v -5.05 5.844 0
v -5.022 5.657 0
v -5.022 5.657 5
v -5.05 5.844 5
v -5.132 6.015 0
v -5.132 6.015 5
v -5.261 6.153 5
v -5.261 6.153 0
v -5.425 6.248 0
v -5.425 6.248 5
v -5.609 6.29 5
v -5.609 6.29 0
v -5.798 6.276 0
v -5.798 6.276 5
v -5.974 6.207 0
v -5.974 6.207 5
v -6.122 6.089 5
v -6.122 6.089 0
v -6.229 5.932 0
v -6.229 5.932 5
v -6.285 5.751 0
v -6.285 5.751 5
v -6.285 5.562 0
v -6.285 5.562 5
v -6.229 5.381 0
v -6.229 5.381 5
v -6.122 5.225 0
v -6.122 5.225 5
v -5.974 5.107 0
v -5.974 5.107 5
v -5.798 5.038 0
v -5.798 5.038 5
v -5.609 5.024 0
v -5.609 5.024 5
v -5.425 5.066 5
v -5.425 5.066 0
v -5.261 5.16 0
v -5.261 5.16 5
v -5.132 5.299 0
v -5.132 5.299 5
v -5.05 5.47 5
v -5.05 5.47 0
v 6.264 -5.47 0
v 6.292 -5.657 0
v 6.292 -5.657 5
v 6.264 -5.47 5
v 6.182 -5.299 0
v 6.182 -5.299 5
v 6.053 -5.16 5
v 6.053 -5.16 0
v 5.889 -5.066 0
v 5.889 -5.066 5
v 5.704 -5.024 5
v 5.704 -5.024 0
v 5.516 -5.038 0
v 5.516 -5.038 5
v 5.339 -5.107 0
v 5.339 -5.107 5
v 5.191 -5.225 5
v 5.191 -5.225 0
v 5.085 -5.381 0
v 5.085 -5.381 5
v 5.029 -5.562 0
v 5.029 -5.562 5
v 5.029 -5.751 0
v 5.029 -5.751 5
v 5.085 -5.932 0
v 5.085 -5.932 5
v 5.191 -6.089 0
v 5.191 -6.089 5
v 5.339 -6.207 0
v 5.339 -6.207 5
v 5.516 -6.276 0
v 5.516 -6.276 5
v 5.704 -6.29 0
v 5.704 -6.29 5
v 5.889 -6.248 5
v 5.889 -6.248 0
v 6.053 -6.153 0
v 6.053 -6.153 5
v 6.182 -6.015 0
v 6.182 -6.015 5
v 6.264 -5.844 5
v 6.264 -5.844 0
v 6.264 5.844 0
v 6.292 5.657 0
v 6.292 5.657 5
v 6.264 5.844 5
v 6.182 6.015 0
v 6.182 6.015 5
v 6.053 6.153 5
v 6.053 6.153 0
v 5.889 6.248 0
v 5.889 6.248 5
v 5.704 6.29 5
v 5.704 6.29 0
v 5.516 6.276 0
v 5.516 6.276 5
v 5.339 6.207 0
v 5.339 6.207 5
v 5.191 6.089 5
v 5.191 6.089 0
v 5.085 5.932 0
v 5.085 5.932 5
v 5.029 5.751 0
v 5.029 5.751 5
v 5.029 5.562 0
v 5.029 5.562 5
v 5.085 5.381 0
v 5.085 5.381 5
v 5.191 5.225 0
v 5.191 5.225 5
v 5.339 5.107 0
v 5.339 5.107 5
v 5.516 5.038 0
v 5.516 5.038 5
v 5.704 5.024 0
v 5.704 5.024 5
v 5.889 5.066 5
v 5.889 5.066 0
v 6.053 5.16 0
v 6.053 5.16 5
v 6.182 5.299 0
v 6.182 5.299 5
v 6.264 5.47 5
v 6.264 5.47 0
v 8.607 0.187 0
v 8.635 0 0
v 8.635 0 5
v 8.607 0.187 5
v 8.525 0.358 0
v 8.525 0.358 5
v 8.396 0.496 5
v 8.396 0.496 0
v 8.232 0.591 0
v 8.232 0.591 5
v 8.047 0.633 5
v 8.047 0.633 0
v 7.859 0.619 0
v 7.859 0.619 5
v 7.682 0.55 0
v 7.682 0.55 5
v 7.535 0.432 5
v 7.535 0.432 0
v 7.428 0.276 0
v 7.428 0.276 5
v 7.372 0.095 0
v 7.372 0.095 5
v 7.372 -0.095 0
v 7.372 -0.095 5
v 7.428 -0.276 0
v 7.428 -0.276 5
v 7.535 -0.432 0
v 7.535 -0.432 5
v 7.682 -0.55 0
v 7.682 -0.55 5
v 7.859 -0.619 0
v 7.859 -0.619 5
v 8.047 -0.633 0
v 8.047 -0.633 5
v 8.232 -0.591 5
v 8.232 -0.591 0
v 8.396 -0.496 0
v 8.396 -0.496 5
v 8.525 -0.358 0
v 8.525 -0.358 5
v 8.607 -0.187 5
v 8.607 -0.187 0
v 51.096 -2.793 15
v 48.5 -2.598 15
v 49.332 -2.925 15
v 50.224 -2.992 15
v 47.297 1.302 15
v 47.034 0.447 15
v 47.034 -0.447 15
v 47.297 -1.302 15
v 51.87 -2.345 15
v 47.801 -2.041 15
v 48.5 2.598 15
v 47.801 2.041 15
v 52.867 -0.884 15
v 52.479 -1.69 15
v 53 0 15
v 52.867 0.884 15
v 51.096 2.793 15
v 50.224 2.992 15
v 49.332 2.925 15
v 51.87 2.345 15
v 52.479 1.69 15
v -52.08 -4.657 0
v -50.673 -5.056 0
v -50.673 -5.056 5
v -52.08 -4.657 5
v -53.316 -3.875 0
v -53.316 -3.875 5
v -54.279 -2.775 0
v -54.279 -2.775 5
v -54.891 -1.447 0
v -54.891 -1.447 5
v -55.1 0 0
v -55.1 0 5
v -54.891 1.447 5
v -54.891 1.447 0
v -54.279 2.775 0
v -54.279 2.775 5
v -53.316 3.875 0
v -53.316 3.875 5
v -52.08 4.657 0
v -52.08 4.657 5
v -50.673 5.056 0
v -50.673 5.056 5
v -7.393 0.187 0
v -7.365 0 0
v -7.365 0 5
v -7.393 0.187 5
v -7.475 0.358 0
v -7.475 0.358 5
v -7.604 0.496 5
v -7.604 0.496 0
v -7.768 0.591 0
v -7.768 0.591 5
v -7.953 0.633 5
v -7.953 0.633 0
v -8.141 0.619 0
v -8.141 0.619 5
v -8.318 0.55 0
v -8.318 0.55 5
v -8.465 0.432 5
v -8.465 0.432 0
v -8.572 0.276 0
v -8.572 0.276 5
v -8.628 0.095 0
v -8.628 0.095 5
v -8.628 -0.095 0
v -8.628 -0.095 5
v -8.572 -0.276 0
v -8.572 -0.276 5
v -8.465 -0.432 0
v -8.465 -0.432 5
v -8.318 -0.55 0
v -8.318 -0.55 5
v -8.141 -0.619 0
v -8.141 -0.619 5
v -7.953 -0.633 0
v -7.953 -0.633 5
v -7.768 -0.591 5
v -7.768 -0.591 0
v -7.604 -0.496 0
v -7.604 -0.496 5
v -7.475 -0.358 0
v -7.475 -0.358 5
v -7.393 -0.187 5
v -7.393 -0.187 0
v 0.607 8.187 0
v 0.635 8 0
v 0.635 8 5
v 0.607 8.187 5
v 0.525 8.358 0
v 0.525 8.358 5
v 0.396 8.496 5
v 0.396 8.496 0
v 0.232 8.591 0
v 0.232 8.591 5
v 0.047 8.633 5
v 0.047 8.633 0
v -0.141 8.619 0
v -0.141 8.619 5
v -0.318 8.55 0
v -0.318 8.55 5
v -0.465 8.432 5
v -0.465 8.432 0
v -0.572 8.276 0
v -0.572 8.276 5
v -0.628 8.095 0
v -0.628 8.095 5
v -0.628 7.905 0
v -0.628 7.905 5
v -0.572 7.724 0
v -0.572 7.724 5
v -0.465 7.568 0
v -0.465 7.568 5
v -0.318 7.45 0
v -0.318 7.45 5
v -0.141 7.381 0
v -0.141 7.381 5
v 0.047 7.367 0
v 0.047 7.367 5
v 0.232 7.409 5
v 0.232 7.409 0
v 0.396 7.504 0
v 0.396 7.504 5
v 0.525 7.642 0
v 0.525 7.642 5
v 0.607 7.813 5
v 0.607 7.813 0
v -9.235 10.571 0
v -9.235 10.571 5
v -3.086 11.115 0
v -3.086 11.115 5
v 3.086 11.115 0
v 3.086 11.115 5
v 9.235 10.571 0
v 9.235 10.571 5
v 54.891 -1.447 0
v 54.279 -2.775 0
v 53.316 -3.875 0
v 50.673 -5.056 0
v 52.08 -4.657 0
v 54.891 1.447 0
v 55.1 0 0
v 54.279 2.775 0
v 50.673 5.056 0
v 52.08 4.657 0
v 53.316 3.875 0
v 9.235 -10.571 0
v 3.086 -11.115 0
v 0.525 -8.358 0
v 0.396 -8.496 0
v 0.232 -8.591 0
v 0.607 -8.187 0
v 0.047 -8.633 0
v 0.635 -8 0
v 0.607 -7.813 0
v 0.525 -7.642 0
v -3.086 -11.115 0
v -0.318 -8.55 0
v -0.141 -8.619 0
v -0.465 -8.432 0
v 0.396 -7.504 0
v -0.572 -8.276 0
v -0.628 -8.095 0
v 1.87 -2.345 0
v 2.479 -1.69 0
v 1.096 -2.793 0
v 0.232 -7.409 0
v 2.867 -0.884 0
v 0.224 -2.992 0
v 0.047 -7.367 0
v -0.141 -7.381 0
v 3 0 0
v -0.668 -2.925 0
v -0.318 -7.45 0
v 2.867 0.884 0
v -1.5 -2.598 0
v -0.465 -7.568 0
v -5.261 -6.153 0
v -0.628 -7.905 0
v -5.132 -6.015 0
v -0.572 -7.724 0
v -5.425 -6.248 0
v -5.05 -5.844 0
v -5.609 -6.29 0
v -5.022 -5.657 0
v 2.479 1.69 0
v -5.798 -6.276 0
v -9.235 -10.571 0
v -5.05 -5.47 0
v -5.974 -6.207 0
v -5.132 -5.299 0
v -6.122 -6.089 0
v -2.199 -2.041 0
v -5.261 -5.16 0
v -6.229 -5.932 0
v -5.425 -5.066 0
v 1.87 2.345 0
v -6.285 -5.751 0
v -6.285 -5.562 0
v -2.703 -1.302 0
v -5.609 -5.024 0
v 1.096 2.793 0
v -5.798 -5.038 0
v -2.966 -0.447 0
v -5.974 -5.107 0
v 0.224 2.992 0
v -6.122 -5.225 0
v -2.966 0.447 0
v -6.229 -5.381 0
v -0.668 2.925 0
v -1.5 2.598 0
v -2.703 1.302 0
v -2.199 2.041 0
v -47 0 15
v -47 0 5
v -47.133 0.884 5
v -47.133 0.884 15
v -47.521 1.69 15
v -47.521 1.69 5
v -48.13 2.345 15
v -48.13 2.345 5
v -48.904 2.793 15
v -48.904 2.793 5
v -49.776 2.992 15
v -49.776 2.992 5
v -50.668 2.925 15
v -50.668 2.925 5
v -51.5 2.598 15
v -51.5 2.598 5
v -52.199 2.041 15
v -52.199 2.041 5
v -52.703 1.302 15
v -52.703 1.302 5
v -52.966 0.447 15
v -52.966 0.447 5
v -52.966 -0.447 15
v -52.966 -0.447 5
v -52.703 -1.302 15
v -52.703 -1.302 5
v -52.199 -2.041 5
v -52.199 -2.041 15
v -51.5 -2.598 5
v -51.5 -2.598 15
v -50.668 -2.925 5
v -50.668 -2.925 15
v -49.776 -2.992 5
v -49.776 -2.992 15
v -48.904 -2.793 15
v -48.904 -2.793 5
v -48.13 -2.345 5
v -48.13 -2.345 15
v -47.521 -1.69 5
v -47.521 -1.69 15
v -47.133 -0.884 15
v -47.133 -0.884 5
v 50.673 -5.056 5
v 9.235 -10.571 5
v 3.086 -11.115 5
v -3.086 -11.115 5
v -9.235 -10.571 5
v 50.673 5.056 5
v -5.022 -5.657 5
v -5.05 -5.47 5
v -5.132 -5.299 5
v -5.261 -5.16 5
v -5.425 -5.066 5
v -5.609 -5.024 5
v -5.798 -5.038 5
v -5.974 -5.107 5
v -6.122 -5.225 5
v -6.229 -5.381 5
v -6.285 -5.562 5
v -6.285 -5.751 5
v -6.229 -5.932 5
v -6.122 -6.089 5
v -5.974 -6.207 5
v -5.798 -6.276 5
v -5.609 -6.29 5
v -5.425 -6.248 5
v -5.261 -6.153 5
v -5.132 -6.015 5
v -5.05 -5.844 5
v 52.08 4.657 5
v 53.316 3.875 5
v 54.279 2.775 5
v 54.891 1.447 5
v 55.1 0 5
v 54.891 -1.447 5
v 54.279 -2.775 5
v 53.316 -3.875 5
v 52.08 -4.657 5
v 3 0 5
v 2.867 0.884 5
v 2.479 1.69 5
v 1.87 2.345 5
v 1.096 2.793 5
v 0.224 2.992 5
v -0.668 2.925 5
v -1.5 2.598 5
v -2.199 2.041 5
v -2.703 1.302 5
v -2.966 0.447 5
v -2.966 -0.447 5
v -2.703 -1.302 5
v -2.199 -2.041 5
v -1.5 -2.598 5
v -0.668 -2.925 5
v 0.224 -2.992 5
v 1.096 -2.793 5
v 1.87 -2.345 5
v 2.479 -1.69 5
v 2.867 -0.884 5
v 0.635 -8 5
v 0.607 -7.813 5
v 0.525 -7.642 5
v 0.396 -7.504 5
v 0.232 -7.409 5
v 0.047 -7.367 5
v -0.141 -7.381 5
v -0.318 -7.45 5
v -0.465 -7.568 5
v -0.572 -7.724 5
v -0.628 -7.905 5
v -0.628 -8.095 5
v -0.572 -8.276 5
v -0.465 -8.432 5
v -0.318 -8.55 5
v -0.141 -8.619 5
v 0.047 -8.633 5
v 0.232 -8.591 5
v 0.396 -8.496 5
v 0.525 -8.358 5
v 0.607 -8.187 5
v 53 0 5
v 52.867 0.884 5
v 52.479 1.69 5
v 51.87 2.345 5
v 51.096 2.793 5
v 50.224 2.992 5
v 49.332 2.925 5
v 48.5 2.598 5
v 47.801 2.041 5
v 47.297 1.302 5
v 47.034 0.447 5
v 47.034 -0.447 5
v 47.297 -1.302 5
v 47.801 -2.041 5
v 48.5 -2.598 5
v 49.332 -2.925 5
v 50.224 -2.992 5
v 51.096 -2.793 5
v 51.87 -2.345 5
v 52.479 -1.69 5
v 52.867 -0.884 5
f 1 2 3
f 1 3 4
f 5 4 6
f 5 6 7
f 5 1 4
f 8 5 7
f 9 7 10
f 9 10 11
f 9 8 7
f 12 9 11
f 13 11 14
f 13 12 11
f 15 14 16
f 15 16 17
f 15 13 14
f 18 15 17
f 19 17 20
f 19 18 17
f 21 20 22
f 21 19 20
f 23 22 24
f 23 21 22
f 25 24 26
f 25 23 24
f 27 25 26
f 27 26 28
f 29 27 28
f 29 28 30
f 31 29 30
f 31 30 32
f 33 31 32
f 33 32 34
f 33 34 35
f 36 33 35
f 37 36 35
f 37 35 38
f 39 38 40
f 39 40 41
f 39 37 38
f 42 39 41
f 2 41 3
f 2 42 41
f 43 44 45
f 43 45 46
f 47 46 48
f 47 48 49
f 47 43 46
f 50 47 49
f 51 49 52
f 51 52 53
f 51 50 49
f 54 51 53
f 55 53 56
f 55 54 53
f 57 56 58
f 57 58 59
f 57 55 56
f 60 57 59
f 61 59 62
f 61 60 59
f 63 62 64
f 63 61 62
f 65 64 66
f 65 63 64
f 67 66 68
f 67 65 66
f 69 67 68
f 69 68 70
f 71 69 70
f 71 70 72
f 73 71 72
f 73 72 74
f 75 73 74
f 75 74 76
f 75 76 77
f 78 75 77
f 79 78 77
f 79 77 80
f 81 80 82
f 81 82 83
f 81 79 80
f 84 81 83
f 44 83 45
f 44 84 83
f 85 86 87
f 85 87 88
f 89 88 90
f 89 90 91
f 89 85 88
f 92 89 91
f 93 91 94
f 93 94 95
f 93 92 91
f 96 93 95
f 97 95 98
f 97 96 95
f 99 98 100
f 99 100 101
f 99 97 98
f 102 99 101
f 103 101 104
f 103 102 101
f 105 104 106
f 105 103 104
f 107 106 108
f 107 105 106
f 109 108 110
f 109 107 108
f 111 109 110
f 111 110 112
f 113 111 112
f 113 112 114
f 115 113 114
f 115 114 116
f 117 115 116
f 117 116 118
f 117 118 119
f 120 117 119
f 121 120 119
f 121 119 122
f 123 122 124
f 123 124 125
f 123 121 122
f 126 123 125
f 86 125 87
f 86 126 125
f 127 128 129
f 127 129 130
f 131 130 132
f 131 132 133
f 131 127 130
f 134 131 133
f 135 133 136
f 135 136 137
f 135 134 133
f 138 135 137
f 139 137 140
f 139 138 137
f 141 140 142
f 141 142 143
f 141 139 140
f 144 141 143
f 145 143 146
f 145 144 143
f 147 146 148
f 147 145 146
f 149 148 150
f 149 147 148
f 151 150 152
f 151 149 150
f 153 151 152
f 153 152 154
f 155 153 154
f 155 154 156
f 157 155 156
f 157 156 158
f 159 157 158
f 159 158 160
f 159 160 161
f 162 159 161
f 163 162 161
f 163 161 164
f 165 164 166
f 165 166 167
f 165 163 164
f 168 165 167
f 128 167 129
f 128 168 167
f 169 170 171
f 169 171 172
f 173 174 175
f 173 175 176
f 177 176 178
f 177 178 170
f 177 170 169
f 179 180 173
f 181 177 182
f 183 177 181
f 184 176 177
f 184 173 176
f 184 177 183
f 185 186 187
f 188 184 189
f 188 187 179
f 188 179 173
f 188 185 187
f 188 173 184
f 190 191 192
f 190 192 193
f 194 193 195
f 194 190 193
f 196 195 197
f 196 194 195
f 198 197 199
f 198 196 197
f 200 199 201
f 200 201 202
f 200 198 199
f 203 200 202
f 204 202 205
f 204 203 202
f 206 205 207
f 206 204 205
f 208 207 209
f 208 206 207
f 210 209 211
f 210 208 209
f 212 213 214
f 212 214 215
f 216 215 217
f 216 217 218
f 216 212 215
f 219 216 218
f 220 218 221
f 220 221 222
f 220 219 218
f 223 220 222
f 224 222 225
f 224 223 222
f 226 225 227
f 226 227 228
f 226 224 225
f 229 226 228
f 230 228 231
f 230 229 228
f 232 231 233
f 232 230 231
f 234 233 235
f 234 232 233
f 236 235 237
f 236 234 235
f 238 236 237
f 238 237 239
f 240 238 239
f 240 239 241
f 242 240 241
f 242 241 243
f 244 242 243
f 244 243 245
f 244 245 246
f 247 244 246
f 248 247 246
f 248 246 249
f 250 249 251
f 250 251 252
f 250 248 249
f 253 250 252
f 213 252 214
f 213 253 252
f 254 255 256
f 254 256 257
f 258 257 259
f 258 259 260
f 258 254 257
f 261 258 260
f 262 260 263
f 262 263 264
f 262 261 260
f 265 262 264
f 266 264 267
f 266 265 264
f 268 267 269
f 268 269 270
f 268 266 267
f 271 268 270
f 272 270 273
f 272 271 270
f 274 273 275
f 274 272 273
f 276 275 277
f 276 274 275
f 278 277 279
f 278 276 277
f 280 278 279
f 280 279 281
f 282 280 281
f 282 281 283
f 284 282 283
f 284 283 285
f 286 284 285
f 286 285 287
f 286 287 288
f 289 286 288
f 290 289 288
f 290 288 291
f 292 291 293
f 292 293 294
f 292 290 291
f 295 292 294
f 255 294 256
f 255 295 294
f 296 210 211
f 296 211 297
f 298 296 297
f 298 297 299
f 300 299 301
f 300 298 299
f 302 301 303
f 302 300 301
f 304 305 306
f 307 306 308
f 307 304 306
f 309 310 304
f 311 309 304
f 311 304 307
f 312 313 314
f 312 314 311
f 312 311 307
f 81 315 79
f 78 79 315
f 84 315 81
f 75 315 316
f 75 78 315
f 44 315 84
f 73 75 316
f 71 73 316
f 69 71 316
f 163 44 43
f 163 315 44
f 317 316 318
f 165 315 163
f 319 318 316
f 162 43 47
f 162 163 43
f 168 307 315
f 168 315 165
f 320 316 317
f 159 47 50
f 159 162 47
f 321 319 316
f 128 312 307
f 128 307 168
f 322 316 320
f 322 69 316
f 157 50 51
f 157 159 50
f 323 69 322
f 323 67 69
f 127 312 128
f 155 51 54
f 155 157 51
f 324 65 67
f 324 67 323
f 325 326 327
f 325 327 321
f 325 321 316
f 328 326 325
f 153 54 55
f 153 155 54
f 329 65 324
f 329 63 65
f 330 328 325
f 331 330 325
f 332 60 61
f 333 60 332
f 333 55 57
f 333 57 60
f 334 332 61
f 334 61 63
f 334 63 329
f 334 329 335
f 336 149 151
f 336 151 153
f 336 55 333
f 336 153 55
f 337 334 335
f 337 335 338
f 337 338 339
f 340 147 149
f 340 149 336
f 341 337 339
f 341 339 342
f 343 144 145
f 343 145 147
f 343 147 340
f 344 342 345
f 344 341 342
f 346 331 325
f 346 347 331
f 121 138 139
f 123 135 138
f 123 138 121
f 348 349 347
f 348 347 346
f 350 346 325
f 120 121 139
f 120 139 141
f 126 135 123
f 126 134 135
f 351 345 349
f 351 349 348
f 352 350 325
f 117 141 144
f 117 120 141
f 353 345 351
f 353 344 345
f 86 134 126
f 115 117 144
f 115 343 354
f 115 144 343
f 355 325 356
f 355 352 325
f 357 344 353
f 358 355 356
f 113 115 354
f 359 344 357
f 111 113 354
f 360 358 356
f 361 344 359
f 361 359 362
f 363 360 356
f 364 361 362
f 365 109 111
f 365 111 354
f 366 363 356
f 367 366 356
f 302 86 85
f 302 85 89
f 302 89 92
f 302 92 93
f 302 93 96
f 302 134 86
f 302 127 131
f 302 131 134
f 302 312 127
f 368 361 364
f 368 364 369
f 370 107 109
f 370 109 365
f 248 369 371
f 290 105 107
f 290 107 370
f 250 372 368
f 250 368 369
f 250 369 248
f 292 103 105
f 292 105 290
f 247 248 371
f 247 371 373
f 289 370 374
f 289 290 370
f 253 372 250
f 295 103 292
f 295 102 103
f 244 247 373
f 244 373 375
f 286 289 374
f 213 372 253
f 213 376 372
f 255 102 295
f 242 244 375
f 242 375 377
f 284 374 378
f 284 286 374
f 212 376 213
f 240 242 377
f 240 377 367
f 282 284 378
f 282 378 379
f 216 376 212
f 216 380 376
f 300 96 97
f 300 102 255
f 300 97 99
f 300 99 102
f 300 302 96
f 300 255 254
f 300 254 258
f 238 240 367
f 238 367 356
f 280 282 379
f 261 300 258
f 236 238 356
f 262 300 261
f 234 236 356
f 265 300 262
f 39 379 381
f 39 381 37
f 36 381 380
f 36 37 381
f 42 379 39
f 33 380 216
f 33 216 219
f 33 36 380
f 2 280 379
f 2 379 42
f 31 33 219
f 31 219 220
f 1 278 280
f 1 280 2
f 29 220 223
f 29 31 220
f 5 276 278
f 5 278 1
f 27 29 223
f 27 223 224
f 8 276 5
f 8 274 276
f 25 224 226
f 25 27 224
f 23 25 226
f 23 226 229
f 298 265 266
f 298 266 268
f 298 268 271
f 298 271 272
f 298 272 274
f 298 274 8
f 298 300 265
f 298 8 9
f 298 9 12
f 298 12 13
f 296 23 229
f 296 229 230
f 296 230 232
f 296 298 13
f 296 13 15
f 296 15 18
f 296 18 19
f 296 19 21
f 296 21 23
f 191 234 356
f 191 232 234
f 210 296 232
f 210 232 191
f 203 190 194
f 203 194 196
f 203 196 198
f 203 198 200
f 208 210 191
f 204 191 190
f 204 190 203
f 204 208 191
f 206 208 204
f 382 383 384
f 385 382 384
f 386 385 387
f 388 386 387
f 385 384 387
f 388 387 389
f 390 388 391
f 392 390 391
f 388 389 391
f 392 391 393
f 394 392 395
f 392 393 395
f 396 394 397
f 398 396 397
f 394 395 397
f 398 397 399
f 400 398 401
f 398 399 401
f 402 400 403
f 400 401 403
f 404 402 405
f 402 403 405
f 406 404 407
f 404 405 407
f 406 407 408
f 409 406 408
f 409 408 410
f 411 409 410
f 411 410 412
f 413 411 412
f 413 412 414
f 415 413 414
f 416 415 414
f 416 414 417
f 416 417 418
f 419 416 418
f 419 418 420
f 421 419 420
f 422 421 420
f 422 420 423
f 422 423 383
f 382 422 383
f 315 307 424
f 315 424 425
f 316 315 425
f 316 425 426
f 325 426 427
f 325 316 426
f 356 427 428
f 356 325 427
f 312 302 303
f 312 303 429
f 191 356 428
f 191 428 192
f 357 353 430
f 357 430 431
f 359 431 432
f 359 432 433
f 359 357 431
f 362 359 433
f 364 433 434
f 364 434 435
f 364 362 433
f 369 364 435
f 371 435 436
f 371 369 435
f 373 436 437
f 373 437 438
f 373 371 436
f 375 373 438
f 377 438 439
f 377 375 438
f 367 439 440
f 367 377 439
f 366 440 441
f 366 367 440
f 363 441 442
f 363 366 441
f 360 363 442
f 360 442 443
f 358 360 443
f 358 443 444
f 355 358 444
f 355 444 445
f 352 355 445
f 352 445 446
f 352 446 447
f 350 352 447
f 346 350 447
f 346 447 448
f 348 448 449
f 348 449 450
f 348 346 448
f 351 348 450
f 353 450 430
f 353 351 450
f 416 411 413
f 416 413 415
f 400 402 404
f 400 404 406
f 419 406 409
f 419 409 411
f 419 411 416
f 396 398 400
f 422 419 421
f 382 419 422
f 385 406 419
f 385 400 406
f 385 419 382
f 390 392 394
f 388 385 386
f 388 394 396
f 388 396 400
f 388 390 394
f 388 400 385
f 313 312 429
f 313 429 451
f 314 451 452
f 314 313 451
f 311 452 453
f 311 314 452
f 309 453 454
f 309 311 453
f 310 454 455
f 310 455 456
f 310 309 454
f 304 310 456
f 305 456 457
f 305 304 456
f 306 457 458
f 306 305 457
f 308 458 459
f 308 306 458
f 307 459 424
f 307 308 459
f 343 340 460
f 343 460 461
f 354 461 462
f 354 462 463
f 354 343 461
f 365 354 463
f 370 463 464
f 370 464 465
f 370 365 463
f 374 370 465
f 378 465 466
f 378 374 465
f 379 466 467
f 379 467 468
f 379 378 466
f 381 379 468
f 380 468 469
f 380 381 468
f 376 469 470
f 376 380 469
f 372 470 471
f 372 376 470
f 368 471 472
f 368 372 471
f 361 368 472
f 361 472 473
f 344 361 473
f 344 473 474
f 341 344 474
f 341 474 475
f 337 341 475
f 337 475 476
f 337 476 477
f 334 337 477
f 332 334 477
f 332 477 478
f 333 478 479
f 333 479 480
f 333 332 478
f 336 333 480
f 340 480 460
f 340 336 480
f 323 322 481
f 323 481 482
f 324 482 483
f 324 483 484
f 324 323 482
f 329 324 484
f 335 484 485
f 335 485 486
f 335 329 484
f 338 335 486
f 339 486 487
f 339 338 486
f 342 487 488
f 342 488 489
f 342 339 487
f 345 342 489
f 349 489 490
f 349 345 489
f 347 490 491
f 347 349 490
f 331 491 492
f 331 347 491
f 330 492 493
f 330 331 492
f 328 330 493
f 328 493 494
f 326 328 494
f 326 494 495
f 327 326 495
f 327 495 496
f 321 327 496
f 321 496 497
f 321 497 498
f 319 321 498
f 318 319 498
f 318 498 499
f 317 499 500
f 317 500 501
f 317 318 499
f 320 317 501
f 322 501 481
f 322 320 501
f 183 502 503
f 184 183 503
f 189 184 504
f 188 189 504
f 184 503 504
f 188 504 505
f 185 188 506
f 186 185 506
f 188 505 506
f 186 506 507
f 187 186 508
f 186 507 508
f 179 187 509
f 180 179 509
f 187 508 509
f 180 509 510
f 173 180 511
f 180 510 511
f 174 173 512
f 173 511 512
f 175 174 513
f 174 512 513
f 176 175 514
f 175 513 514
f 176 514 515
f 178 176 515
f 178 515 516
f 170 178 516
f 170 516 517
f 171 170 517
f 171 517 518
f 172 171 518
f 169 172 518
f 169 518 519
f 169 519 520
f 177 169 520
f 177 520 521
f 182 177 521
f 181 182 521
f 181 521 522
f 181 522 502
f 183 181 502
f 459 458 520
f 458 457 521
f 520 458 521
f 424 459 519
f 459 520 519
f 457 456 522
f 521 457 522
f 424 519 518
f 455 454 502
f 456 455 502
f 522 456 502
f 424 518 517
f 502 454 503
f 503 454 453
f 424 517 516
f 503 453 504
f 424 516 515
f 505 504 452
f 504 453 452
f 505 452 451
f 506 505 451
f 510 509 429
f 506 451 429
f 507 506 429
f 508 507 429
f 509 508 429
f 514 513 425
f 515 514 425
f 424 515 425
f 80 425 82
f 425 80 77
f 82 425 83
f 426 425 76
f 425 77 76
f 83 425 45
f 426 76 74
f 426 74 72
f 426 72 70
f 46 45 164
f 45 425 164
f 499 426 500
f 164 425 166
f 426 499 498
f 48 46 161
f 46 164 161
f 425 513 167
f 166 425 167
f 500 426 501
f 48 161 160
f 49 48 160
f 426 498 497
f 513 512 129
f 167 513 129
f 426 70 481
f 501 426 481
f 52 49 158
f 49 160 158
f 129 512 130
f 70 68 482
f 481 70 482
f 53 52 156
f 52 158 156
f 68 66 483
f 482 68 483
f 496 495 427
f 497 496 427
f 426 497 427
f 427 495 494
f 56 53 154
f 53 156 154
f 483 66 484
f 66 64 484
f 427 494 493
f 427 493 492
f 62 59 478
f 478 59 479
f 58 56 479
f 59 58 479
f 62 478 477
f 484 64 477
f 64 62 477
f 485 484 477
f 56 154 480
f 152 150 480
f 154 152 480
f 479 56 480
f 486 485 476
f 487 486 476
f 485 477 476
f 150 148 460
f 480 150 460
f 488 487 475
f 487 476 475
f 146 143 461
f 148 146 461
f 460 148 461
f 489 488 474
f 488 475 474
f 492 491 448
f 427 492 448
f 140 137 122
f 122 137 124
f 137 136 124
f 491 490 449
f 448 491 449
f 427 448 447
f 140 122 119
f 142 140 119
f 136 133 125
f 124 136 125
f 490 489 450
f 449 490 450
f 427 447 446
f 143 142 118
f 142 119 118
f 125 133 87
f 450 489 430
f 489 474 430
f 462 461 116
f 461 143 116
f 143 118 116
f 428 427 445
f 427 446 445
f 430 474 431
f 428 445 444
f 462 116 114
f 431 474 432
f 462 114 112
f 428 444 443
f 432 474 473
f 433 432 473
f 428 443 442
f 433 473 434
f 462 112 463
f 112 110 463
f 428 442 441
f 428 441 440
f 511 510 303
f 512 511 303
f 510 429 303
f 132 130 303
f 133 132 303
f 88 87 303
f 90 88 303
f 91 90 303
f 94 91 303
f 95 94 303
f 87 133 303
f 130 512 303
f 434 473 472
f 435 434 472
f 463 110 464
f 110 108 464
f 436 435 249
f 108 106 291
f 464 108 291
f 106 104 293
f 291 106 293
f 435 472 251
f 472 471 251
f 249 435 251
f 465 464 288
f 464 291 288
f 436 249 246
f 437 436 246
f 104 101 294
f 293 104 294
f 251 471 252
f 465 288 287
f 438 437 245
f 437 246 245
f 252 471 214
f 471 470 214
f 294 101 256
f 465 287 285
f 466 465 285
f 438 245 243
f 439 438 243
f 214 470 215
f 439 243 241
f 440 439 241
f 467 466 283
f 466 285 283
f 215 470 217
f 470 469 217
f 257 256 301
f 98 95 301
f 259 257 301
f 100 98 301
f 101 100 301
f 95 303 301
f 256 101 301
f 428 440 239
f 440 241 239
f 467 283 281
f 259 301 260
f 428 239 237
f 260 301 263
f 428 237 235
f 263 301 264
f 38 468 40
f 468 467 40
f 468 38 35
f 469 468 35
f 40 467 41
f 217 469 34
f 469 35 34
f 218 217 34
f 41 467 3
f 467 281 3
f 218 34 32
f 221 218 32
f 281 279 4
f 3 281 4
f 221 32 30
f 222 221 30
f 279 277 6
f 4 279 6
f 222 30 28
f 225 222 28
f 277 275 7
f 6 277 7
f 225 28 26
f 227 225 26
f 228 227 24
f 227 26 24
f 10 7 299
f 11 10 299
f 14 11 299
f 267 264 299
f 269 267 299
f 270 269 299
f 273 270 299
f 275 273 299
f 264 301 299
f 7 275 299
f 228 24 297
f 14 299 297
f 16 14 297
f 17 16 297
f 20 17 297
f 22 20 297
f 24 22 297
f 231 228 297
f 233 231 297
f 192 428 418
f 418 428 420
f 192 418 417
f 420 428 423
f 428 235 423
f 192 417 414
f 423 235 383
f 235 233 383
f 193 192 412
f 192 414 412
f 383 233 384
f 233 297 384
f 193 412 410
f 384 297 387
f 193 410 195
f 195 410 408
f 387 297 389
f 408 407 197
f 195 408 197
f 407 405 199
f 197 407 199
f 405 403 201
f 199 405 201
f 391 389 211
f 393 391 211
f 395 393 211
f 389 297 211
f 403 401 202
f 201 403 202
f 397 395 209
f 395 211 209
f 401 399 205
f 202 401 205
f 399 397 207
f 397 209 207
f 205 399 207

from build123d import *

# Parameters (mm, degrees)
SZKIC1_R                    = 3
SZKIC1_R_2                  = 0.635
DODANIE_WYCI_GNI_CIE1_DEPTH = 5
SZKIC1_2_R                  = 3
DODANIE_WYCI_GNI_CIE2_DEPTH = 15


with BuildPart() as part:
    # Szkic1 → Dodanie-wyci_gni_cie1 (new body)
    with BuildSketch(Plane.XY):
        with BuildLine():
            Line((-50.67287635, 5.055665151), (-9.235111676, 10.570763761))
            ThreePointArc((-9.235111676, 10.570763761), (0, 11.182632843), (9.235111676, 10.570763761))
            Line((9.235111676, 10.570763761), (50.67287635, 5.055665151))
            ThreePointArc((50.67287635, 5.055665151), (55.100246338, 0), (50.67287635, -5.055665151))
            Line((50.67287635, -5.055665151), (9.235111676, -10.570763761))
            ThreePointArc((9.235111676, -10.570763761), (0, -11.182632843), (-9.235111676, -10.570763761))
            Line((-9.235111676, -10.570763761), (-50.67287635, -5.055665151))
            ThreePointArc((-50.67287635, -5.055665151), (-55.100246338, 0), (-50.67287635, 5.055665151))
        make_face()
        Circle(SZKIC1_R, mode=Mode.SUBTRACT)
        with Locations((-5.656854249, 5.656854249)):
            Circle(SZKIC1_R_2, mode=Mode.SUBTRACT)
        with Locations((-8, 0)):
            Circle(SZKIC1_R_2, mode=Mode.SUBTRACT)
        with Locations((0, 8)):
            Circle(SZKIC1_R_2, mode=Mode.SUBTRACT)
        with Locations((5.656854249, 5.656854249)):
            Circle(SZKIC1_R_2, mode=Mode.SUBTRACT)
        with Locations((-50, 0)):
            Circle(SZKIC1_R, mode=Mode.SUBTRACT)
        with Locations((50, 0)):
            Circle(SZKIC1_R, mode=Mode.SUBTRACT)
        with Locations((8, 0)):
            Circle(SZKIC1_R_2, mode=Mode.SUBTRACT)
        with Locations((5.656854249, -5.656854249)):
            Circle(SZKIC1_R_2, mode=Mode.SUBTRACT)
        with Locations((0, -8)):
            Circle(SZKIC1_R_2, mode=Mode.SUBTRACT)
        with Locations((-5.656854249, -5.656854249)):
            Circle(SZKIC1_R_2, mode=Mode.SUBTRACT)
    extrude(amount=DODANIE_WYCI_GNI_CIE1_DEPTH)

    # Szkic1_2 → Dodanie-wyci_gni_cie2 (add)
    with BuildSketch(Plane.XY):
        with Locations((-50, 0)):
            Circle(SZKIC1_2_R)
        with Locations((50, 0)):
            Circle(SZKIC1_2_R)
    extrude(amount=DODANIE_WYCI_GNI_CIE2_DEPTH)


solid = part.part
